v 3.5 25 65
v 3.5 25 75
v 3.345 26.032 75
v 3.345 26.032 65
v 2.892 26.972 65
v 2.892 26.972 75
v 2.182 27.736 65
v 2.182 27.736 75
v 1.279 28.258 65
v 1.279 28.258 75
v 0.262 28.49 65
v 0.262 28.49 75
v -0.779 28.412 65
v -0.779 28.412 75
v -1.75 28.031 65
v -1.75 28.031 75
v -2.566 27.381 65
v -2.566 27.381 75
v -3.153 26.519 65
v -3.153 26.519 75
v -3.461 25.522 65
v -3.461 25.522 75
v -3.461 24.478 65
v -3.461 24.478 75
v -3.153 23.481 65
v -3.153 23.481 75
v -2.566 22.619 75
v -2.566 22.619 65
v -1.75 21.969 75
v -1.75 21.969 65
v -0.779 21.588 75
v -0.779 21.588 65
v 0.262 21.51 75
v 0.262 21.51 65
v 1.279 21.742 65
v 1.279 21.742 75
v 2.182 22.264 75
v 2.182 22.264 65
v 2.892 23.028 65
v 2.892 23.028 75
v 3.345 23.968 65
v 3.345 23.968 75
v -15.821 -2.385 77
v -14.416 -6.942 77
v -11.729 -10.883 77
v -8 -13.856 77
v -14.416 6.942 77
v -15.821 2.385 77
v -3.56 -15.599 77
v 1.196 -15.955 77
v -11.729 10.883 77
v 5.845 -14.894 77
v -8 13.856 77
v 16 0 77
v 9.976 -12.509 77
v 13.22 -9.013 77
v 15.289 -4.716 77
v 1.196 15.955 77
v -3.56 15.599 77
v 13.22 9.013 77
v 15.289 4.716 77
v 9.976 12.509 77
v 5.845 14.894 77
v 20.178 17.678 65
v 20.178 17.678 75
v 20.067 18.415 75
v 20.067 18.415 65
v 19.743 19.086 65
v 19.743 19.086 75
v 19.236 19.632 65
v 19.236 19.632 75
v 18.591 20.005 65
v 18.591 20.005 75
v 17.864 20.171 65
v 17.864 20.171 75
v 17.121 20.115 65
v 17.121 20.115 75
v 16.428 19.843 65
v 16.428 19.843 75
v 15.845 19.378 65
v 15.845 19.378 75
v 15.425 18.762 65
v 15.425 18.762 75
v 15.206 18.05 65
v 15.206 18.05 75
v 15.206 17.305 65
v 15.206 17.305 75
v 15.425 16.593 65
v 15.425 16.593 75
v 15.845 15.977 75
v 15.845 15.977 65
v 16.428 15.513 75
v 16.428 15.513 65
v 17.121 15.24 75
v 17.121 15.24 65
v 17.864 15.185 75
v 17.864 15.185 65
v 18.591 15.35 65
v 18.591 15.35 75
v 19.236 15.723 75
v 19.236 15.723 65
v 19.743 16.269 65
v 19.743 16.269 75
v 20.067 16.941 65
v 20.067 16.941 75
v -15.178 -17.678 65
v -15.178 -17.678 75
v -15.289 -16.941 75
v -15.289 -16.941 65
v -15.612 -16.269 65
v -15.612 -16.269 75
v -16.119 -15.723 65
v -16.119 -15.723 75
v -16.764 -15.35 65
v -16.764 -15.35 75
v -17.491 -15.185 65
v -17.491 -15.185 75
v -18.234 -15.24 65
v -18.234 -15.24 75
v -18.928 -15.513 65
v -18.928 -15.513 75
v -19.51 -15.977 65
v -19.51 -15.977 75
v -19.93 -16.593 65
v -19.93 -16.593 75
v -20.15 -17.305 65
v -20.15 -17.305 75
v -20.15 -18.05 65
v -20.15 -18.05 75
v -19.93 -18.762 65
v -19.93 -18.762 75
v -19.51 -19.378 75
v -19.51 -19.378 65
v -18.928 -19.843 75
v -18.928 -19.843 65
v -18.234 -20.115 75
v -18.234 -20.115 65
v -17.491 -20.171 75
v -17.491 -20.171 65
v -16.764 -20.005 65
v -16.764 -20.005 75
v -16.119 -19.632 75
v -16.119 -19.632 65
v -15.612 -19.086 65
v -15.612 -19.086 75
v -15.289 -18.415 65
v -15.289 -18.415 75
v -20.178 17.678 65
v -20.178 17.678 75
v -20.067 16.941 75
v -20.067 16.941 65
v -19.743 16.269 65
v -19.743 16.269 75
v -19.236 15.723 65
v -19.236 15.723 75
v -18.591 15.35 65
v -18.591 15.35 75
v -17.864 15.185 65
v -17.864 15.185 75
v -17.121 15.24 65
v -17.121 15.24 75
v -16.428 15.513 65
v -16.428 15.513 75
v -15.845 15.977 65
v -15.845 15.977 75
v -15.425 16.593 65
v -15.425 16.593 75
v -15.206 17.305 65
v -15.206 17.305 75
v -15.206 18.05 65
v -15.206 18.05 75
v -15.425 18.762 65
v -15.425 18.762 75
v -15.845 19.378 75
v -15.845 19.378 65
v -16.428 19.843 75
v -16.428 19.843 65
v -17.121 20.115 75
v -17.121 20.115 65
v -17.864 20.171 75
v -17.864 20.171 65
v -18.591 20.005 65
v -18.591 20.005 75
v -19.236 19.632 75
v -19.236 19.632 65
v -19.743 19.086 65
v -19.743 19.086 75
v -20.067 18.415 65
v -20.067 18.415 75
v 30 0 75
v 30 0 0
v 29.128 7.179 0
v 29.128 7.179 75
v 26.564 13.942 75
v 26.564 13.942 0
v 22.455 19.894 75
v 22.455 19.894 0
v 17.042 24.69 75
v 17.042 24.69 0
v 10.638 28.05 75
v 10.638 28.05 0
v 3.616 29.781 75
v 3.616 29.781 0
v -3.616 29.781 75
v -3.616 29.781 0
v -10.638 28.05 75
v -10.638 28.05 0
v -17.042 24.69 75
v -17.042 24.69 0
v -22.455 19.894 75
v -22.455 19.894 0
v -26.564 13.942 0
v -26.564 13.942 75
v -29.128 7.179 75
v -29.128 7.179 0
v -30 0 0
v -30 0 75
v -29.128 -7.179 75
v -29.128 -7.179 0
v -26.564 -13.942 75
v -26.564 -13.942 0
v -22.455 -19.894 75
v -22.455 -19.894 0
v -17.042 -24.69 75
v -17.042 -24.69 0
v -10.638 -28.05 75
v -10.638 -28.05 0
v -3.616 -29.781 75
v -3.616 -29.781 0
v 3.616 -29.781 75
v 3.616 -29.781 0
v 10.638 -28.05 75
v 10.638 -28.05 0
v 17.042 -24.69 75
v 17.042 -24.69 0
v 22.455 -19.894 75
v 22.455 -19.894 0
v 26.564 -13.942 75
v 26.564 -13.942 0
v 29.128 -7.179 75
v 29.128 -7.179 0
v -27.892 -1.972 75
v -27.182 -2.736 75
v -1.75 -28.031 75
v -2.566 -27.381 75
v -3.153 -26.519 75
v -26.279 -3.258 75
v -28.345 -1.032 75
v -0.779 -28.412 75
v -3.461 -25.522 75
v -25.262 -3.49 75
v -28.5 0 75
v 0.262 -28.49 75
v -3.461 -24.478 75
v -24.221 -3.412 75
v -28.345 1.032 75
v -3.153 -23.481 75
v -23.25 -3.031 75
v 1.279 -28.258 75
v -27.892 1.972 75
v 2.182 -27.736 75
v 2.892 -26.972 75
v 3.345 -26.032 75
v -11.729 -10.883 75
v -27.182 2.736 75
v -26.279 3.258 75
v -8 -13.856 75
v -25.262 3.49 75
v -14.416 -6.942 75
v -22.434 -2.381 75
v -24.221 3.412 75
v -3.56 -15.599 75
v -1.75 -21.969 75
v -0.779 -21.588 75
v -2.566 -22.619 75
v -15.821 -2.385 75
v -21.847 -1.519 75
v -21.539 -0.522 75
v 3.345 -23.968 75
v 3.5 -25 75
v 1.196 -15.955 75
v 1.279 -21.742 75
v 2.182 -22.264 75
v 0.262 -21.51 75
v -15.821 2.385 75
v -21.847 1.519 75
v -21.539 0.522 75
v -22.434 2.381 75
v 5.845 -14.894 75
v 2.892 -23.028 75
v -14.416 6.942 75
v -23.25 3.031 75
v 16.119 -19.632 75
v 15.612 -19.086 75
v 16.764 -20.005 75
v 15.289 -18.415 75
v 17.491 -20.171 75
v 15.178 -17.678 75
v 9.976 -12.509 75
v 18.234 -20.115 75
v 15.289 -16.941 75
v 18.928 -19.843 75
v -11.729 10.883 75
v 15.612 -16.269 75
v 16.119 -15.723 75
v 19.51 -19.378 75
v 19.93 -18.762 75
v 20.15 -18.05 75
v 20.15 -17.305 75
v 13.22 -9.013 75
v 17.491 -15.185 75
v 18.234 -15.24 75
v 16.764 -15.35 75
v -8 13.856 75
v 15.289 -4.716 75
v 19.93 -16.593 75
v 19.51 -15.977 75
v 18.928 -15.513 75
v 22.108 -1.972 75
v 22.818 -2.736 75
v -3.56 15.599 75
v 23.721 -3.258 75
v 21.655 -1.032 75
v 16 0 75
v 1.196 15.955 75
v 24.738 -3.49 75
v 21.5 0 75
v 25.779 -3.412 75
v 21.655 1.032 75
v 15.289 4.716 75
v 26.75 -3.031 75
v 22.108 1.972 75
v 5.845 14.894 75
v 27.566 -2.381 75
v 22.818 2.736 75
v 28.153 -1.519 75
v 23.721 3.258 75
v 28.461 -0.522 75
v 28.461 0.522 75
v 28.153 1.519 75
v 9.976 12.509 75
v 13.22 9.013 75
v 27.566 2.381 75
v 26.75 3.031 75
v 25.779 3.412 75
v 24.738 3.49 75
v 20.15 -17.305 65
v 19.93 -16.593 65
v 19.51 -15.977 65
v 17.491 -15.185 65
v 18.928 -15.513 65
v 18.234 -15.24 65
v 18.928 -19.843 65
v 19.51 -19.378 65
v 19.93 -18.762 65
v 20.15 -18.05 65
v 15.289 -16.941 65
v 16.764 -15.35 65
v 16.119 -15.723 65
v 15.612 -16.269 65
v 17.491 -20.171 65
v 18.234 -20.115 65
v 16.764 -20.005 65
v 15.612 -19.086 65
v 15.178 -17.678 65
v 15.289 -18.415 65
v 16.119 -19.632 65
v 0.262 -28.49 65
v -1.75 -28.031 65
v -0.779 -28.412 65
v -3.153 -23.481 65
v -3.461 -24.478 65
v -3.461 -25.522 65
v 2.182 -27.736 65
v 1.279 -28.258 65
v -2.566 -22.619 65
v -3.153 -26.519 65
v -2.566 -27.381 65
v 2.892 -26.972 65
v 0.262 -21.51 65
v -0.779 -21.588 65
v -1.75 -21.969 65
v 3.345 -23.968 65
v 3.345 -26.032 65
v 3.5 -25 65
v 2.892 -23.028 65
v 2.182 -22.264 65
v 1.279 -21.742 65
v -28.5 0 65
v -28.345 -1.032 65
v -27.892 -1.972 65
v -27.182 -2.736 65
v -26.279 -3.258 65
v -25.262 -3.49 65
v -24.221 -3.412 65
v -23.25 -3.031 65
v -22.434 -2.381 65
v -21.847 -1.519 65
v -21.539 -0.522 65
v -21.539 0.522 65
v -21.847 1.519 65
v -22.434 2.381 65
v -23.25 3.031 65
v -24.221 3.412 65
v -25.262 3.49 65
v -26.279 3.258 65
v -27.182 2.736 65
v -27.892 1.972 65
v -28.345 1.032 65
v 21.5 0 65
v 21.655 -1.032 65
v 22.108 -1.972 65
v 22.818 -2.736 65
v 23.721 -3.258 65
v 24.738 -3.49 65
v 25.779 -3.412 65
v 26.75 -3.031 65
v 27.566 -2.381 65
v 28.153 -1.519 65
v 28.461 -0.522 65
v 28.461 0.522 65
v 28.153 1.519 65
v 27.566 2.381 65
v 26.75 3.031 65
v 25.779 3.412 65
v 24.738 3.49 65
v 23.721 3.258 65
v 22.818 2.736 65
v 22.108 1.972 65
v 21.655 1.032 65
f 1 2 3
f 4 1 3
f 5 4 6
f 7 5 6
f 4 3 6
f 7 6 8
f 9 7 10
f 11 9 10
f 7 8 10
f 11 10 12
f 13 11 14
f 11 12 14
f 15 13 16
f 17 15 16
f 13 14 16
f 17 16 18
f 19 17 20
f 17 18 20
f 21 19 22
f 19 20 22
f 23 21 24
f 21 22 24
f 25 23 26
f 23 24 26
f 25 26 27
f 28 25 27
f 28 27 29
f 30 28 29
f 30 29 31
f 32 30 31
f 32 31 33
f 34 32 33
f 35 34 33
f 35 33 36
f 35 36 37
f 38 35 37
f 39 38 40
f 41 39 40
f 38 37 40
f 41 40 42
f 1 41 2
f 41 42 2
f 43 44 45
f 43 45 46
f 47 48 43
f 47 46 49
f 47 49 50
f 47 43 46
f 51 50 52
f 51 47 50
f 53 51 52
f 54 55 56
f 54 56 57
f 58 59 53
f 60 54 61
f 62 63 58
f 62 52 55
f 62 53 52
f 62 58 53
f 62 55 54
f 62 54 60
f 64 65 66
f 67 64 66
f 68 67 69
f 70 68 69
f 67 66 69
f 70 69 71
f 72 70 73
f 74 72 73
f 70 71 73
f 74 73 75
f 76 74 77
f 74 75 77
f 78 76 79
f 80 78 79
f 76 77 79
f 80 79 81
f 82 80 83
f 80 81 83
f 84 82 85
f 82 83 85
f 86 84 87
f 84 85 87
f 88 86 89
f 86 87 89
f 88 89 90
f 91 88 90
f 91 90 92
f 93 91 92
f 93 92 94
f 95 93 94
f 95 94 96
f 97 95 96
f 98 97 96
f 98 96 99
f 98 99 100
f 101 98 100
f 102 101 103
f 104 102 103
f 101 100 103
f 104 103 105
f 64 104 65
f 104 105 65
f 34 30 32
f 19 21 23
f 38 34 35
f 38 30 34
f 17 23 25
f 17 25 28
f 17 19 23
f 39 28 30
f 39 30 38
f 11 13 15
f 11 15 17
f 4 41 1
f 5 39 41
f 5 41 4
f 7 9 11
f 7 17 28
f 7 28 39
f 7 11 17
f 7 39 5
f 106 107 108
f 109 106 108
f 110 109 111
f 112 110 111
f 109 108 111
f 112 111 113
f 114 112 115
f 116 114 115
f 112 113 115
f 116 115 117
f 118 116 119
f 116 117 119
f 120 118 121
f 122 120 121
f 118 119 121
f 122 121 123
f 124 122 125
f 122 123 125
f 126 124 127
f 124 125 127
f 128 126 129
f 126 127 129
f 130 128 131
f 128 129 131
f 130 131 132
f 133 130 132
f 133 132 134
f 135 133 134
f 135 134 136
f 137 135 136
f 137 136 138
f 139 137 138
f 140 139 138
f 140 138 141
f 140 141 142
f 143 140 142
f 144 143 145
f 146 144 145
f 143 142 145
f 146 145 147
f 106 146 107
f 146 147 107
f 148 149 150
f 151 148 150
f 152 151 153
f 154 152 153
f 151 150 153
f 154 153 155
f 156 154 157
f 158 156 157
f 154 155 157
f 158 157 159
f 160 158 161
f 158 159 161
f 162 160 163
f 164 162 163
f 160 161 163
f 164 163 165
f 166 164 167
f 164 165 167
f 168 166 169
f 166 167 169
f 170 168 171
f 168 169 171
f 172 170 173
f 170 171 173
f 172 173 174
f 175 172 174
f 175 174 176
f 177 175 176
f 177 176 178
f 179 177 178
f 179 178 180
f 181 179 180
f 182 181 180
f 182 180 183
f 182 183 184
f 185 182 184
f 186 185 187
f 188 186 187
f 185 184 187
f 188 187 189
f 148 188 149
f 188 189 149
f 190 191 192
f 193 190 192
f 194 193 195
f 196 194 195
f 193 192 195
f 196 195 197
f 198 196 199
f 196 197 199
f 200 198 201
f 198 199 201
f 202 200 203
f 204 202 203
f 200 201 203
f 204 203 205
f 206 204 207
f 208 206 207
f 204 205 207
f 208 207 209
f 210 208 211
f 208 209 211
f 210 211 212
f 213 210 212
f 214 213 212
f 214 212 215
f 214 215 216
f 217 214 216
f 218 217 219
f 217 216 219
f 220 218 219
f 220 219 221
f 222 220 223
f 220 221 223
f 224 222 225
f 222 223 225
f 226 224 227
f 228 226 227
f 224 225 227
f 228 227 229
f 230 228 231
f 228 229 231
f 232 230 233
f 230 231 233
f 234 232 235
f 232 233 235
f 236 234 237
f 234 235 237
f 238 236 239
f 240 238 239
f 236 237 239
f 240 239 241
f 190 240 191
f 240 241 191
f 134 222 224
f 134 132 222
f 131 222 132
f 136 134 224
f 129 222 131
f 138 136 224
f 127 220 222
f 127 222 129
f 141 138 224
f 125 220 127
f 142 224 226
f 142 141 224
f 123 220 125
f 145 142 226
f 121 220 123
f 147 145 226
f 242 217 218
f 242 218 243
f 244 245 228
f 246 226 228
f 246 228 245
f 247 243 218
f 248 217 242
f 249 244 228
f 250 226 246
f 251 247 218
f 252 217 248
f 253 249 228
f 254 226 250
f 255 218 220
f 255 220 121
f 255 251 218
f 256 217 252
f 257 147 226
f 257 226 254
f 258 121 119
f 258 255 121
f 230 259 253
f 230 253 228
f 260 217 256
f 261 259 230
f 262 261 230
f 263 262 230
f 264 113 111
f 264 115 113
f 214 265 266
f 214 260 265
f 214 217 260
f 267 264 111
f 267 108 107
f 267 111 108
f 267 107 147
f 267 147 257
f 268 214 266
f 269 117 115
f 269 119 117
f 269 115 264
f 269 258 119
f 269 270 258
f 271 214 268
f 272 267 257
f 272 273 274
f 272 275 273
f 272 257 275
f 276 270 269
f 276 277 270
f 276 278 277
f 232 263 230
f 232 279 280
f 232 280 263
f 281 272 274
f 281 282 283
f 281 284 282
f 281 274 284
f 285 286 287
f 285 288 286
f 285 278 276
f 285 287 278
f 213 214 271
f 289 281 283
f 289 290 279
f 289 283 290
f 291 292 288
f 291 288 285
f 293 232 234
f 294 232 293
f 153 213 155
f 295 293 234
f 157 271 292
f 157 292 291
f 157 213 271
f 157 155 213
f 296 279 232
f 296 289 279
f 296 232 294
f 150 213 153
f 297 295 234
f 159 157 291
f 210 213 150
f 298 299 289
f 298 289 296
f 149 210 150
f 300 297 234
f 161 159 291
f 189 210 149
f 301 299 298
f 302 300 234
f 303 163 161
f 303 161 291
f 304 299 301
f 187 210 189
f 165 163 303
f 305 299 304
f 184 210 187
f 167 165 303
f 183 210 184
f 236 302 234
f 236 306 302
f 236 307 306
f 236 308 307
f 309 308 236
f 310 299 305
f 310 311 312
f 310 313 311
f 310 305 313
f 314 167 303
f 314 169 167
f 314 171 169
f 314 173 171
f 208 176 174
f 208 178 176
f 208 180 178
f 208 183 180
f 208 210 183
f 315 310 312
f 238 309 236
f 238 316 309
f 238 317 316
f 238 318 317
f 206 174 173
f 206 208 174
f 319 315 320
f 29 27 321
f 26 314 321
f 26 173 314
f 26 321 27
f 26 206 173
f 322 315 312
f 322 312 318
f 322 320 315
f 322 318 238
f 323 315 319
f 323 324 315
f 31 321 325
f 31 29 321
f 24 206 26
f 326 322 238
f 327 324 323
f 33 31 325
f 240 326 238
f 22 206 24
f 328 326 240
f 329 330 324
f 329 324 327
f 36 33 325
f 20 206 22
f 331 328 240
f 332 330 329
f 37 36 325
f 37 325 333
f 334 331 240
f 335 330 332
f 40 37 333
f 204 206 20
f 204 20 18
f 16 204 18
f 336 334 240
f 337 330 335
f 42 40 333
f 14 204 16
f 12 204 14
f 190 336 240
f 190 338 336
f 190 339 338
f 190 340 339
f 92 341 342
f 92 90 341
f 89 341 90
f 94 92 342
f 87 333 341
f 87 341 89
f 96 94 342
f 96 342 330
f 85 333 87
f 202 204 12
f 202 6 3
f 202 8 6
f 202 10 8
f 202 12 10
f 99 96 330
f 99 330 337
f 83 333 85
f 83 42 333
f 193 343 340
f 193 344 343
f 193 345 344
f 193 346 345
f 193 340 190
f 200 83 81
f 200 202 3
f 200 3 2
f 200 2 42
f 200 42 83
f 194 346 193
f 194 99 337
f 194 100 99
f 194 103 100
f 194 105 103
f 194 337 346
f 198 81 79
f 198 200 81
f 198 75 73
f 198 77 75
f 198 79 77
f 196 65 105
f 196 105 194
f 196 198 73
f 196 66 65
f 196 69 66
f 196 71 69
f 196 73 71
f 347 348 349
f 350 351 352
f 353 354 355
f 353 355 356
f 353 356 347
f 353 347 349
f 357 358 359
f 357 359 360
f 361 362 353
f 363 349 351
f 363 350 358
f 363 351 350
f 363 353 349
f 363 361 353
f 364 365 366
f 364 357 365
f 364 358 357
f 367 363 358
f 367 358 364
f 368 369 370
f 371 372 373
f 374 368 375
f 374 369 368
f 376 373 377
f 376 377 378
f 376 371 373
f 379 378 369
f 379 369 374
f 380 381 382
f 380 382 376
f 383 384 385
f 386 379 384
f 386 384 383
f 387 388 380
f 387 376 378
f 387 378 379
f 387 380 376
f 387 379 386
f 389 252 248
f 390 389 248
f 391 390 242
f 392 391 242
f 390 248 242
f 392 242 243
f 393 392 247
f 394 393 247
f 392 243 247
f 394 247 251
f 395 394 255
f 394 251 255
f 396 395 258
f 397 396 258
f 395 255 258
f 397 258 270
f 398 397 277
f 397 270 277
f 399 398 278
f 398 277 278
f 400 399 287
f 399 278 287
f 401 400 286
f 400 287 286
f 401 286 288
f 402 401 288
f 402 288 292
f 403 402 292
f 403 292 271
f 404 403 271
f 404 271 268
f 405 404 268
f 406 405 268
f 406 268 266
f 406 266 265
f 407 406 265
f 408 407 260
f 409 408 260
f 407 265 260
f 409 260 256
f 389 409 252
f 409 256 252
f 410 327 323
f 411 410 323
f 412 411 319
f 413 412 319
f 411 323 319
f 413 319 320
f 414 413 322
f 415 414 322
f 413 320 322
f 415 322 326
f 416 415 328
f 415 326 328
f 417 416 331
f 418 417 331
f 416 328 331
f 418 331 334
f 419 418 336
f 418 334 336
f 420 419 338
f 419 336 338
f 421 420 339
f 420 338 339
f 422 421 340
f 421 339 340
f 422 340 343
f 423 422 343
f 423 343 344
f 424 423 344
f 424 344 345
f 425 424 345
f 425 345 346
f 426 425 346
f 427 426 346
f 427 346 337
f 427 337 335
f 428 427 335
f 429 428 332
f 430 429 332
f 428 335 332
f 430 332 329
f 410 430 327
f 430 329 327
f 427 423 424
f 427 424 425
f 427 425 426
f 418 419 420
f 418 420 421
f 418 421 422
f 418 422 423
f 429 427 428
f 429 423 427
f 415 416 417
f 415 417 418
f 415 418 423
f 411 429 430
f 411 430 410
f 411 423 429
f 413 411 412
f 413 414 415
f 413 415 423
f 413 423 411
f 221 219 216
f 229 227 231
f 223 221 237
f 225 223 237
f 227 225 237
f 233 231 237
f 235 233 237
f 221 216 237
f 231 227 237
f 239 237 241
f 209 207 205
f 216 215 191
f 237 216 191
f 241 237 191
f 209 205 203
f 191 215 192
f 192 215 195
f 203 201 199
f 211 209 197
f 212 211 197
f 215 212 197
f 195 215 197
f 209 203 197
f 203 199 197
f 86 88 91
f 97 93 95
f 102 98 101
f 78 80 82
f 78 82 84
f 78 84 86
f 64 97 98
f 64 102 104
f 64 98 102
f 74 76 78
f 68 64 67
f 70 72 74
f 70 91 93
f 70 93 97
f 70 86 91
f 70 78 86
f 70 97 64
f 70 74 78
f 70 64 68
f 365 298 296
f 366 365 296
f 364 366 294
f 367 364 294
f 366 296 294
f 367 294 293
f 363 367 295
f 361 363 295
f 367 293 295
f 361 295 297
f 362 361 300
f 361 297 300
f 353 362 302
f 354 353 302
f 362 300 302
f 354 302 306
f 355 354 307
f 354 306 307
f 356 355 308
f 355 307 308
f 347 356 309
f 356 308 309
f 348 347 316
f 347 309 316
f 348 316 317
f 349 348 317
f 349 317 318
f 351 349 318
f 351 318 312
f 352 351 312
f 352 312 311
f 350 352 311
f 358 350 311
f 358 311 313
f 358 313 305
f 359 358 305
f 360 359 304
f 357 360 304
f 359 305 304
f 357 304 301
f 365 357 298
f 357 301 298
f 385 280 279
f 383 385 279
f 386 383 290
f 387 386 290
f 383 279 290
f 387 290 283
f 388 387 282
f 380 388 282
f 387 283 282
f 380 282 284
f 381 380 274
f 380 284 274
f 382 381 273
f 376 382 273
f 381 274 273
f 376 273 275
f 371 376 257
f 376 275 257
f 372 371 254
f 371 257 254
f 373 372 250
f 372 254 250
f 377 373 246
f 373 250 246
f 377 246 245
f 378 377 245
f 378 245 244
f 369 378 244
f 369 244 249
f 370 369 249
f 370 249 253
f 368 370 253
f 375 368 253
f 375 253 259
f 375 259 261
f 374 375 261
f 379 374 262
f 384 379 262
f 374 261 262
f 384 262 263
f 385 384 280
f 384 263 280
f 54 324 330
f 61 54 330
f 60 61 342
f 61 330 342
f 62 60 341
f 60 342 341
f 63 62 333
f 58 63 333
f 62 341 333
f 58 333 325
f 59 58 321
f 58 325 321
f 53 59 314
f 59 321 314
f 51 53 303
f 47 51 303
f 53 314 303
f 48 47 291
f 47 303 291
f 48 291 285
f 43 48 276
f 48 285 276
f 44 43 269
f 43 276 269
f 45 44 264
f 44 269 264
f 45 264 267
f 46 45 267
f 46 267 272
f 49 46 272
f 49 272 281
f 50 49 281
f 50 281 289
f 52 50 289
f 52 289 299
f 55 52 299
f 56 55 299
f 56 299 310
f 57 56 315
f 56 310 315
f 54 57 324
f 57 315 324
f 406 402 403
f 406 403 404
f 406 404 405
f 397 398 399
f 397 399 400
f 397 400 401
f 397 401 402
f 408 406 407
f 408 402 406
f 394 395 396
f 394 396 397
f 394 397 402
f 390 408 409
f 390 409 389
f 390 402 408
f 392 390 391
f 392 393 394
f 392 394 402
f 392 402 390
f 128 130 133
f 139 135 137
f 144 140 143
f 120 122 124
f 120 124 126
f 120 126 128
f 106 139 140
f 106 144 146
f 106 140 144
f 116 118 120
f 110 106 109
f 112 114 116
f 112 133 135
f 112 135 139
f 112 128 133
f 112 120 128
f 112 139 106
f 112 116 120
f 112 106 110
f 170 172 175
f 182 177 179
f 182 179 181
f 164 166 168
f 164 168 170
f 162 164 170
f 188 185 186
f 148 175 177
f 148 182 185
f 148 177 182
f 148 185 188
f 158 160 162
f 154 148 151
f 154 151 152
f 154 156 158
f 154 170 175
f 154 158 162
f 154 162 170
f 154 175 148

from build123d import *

# Parameters (mm, degrees)
SKETCH1_R           = 30
BOSS_EXTRUDE1_DEPTH = 75
SKETCH2_R           = 3.5
SKETCH2_R_2         = 2.5
CUT_EXTRUDE1_DEPTH  = 10
SKETCH3_R           = 16
BOSS_EXTRUDE2_DEPTH = 2


with BuildPart() as part:
    # Sketch1 → Boss-Extrude1 (new body)
    with BuildSketch(Plane.XY):
        Circle(SKETCH1_R)
    extrude(amount=BOSS_EXTRUDE1_DEPTH)

    # Sketch2 → Cut-Extrude1 (cut)
    with BuildSketch(Plane.XY.offset(75)):
        with Locations((0, 25)):
            Circle(SKETCH2_R)
        with Locations((17.67766953, 17.67766953)):
            Circle(SKETCH2_R_2)
        with Locations(Location((-17.67766953, 17.67766953, 0), (0, 0, 180))):
            Circle(SKETCH2_R_2)
        with Locations(Location((17.67766953, -17.67766953, 0), (0, 0, 180))):
            Circle(SKETCH2_R_2)
        with Locations((-17.67766953, -17.67766953)):
            Circle(SKETCH2_R_2)
        with Locations(Location((25, 0, 0), (0, 0, 180))):
            Circle(SKETCH2_R)
        with Locations(Location((-25, 0, 0), (0, 0, 180))):
            Circle(SKETCH2_R)
        with Locations((0, -25)):
            Circle(SKETCH2_R)
    extrude(amount=-CUT_EXTRUDE1_DEPTH, mode=Mode.SUBTRACT)

    # Sketch3 → Boss-Extrude2 (add)
    with BuildSketch(Plane.XY.offset(75)):
        Circle(SKETCH3_R)
    extrude(amount=BOSS_EXTRUDE2_DEPTH)


solid = part.part
